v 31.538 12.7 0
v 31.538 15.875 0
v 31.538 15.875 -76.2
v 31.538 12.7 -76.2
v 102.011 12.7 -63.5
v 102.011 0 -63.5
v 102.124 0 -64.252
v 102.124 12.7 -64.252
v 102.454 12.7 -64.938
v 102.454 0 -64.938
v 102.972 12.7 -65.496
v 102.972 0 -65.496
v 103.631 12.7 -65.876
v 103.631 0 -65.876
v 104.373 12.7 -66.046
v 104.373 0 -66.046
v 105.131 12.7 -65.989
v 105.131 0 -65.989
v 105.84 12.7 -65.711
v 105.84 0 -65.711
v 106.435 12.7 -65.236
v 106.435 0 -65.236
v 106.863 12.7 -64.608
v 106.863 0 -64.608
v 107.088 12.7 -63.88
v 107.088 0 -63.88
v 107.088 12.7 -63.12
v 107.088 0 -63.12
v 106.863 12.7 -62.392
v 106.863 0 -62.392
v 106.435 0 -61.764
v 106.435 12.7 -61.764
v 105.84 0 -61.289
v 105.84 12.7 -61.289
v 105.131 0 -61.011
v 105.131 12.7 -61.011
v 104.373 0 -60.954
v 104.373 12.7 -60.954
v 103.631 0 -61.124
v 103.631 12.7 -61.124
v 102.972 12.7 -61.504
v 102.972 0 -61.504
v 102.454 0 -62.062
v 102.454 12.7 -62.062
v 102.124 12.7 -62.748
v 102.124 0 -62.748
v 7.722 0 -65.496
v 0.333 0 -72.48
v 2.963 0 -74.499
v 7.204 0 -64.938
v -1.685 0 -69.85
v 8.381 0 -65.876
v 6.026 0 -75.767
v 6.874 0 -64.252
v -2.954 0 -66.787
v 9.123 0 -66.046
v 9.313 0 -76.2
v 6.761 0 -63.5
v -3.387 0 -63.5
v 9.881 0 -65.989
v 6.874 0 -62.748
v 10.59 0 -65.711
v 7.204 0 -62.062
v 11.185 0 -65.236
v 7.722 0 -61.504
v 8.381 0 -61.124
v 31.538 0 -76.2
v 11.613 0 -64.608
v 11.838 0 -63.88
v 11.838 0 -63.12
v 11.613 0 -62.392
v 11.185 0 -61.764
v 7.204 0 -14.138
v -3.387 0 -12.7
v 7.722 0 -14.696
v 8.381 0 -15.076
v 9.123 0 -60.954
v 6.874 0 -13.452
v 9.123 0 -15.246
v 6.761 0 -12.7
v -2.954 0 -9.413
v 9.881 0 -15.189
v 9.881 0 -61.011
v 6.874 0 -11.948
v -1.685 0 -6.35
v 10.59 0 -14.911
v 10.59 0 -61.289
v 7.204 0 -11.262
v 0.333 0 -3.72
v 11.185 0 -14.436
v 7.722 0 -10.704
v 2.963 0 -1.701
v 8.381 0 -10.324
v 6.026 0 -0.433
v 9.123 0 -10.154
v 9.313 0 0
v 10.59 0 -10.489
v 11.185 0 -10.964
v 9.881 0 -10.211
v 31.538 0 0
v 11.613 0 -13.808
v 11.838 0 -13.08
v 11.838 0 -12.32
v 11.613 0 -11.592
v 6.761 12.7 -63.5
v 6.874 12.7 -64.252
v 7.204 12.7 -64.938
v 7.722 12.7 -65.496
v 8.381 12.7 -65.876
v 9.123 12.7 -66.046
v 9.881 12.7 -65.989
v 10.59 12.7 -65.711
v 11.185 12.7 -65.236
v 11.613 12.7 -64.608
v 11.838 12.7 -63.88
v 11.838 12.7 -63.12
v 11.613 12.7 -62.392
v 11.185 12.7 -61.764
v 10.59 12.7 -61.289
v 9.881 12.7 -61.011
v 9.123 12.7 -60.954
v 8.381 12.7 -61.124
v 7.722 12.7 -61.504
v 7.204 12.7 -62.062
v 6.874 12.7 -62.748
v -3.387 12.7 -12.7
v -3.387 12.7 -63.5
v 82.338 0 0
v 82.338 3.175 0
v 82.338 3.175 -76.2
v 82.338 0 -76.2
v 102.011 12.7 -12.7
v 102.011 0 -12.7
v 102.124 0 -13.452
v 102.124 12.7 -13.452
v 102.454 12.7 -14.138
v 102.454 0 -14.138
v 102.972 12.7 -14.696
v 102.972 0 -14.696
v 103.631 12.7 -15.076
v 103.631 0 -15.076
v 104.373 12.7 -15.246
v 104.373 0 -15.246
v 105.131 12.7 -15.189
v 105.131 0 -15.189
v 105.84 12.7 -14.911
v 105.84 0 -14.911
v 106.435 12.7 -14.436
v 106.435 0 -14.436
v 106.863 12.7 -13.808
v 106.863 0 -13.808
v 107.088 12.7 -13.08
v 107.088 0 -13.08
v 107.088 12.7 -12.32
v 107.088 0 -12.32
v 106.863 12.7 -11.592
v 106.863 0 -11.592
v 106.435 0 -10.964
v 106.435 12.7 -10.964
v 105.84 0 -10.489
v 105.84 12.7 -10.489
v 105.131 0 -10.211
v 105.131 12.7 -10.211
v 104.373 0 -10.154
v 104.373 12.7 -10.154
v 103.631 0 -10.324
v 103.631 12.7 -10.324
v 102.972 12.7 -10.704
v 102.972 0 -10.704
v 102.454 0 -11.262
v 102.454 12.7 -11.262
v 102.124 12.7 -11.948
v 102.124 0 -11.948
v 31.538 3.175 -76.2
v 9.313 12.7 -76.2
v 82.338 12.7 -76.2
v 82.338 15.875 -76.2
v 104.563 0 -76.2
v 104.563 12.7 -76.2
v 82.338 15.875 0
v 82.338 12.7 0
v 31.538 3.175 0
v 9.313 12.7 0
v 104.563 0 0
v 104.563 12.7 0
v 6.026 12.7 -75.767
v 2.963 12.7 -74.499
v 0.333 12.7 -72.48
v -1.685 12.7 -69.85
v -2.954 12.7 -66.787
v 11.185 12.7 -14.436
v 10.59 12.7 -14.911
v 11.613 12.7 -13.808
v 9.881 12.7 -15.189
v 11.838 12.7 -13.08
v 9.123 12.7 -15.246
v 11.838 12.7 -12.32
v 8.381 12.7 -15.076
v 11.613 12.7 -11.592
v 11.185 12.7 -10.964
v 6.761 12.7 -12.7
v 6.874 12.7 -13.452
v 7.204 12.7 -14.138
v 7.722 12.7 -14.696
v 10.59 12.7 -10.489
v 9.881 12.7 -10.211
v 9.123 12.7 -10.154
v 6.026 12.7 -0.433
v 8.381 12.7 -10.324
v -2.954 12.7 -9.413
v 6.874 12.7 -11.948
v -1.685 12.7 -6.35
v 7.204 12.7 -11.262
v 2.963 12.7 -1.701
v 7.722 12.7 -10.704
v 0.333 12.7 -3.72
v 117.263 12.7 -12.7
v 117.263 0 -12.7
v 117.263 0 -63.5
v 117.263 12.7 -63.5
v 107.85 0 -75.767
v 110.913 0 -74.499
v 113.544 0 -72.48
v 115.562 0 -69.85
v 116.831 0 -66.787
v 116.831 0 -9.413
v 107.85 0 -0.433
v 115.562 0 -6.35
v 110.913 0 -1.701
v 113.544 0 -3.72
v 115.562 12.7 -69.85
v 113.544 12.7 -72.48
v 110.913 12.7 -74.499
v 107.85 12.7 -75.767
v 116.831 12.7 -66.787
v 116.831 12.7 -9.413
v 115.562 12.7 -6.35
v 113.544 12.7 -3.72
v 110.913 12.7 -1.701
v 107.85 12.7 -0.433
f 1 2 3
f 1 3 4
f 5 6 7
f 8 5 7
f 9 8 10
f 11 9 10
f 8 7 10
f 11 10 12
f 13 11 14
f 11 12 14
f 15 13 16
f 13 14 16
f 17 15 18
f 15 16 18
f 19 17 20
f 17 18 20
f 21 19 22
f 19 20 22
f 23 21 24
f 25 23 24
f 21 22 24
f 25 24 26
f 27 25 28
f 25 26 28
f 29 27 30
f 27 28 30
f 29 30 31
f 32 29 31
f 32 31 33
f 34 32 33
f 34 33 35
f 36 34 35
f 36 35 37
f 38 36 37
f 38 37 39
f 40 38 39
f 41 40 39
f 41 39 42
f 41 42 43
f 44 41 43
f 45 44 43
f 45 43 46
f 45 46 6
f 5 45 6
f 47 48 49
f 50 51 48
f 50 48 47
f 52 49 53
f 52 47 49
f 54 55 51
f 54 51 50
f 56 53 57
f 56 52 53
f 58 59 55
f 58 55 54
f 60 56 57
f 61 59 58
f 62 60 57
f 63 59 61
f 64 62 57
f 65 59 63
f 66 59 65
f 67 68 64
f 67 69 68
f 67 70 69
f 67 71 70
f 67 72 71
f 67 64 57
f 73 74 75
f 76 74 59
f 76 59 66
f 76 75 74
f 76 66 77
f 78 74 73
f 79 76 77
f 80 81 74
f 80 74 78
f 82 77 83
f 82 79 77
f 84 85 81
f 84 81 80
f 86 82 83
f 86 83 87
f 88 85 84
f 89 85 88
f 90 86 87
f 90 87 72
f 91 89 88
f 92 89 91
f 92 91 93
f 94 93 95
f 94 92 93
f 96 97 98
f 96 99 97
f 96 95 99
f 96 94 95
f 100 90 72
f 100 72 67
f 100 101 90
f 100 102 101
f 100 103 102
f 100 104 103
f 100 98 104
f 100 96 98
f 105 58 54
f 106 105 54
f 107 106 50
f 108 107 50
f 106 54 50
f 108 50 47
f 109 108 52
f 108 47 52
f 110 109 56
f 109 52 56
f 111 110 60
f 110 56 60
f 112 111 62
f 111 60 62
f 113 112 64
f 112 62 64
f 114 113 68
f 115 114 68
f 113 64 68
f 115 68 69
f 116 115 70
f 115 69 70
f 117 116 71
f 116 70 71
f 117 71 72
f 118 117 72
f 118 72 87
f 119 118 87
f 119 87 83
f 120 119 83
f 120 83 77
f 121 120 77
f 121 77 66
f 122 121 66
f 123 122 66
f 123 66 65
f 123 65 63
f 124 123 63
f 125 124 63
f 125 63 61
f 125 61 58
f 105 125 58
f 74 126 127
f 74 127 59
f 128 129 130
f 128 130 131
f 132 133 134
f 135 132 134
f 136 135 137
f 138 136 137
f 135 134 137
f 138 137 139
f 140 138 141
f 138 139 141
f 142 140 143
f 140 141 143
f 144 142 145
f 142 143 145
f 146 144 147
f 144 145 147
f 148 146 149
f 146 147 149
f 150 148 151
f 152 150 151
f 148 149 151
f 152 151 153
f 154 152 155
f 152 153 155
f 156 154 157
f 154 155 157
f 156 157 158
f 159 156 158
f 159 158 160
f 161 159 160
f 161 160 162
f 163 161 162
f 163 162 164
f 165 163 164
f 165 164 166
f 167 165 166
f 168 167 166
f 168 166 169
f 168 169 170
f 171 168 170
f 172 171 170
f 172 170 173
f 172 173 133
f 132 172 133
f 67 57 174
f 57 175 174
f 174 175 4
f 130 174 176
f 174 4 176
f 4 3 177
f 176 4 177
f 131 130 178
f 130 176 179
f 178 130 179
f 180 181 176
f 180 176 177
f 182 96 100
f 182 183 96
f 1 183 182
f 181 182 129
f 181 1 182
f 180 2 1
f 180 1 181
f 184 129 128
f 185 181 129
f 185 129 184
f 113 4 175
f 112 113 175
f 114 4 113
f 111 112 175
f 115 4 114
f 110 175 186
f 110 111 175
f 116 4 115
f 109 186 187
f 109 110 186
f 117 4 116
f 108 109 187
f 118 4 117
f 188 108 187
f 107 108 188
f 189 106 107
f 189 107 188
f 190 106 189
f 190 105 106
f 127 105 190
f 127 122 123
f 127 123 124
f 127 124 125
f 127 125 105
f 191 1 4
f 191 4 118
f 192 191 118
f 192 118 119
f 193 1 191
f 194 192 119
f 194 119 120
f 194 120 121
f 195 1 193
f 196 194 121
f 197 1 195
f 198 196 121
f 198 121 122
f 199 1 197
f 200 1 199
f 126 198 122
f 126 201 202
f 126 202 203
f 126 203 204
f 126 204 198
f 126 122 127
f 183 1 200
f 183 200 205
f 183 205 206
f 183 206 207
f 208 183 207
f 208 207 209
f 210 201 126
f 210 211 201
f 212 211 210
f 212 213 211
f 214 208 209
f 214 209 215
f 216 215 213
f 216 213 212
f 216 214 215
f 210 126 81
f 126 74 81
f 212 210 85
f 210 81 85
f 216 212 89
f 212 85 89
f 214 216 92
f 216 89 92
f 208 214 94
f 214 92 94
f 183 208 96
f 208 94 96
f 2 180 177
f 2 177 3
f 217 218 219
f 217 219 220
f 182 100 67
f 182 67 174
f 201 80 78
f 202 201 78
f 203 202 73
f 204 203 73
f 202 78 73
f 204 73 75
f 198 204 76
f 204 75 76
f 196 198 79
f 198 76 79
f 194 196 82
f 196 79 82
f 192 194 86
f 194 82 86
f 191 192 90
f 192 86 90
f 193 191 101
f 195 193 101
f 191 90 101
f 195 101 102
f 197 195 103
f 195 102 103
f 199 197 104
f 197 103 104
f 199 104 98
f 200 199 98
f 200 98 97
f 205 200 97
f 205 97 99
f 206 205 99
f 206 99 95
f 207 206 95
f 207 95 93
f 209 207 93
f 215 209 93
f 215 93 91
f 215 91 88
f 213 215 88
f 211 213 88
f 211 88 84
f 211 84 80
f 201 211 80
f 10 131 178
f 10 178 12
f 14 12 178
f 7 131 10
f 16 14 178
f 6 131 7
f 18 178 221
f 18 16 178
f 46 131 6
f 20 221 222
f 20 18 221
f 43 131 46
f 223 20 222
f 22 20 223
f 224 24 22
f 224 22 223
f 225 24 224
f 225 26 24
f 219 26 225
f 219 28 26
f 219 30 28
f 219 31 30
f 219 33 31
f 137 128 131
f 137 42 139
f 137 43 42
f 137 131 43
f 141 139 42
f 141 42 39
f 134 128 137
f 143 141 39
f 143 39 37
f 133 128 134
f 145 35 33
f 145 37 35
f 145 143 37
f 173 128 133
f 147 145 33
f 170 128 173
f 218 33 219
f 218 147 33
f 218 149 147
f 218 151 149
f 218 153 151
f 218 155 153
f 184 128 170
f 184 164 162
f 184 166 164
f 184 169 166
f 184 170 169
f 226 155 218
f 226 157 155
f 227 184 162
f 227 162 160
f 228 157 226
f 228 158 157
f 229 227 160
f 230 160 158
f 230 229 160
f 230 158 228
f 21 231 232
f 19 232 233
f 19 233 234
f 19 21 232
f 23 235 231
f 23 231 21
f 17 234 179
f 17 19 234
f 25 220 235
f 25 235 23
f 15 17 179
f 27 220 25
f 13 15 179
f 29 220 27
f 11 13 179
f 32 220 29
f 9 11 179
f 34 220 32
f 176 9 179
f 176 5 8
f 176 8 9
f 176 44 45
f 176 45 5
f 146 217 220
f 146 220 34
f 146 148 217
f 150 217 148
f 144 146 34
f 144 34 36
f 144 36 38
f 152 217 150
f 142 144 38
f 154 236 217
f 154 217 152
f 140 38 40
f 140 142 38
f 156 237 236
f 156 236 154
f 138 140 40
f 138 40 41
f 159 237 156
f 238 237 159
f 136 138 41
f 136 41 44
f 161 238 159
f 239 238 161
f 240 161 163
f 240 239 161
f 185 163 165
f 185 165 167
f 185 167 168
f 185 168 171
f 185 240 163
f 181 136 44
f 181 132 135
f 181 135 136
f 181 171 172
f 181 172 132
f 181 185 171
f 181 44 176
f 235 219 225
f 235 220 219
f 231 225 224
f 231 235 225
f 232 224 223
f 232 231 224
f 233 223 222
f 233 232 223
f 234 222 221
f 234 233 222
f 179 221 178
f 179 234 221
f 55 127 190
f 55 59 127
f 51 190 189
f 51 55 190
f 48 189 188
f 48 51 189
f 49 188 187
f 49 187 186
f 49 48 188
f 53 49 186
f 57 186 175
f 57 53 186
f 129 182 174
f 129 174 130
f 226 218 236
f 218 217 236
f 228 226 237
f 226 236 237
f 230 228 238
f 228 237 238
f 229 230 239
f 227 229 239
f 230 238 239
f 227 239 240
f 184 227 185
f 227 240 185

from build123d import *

# Parameters (mm, degrees)
BOSS_EXTRUDE1_DEPTH         = 76.2
FILLET1_R                   = 12.7
F_1_4_20_TAPPED_HOLE3_D     = 5.1054
F_1_4_20_TAPPED_HOLE3_DEPTH = 16.51
F_1_4_20_TAPPED_HOLE3_TIP   = 1.533816902


with BuildPart() as part:
    # Sketch1 → Boss-Extrude1 (new body)
    with BuildSketch(Plane.XY):
        Polygon((-3.386666667, 0), (31.538333333, 0), (31.538333333, 3.175), (82.338333333, 3.175), (82.338333333, 0), (117.263333333, 0), (117.263333333, 12.7), (82.338333333, 12.7), (82.338333333, 15.875), (31.538333333, 15.875), (31.538333333, 12.7), (-3.386666667, 12.7), align=None)
    extrude(amount=-BOSS_EXTRUDE1_DEPTH)

    # Fillet1
    fillet1_edges = [part.edges().sort_by_distance(p)[0] for p in [
        (117.263333333, 6.35, 0),
        (-3.386666667, 6.35, 0),
        (117.263333333, 6.35, -76.2),
        (-3.386666667, 6.35, -76.2),
    ]]
    fillet(fillet1_edges, radius=FILLET1_R)

    # 1/4-20 Tapped Hole3
    with Locations(Plane(origin=(0, 12.7, 0), x_dir=(1, 0, 0), z_dir=(0, 1, 0))):
        with Locations((104.563333333, 63.5), (104.563333333, 12.7), (9.313333333, 12.7), (9.313333333, 63.5)):
            Hole(F_1_4_20_TAPPED_HOLE3_D / 2, depth=F_1_4_20_TAPPED_HOLE3_DEPTH)
            with Locations((0, 0, -(F_1_4_20_TAPPED_HOLE3_DEPTH + F_1_4_20_TAPPED_HOLE3_TIP / 2))):  # 118° drill point
                Cone(0, F_1_4_20_TAPPED_HOLE3_D / 2, F_1_4_20_TAPPED_HOLE3_TIP, mode=Mode.SUBTRACT)


solid = part.part
